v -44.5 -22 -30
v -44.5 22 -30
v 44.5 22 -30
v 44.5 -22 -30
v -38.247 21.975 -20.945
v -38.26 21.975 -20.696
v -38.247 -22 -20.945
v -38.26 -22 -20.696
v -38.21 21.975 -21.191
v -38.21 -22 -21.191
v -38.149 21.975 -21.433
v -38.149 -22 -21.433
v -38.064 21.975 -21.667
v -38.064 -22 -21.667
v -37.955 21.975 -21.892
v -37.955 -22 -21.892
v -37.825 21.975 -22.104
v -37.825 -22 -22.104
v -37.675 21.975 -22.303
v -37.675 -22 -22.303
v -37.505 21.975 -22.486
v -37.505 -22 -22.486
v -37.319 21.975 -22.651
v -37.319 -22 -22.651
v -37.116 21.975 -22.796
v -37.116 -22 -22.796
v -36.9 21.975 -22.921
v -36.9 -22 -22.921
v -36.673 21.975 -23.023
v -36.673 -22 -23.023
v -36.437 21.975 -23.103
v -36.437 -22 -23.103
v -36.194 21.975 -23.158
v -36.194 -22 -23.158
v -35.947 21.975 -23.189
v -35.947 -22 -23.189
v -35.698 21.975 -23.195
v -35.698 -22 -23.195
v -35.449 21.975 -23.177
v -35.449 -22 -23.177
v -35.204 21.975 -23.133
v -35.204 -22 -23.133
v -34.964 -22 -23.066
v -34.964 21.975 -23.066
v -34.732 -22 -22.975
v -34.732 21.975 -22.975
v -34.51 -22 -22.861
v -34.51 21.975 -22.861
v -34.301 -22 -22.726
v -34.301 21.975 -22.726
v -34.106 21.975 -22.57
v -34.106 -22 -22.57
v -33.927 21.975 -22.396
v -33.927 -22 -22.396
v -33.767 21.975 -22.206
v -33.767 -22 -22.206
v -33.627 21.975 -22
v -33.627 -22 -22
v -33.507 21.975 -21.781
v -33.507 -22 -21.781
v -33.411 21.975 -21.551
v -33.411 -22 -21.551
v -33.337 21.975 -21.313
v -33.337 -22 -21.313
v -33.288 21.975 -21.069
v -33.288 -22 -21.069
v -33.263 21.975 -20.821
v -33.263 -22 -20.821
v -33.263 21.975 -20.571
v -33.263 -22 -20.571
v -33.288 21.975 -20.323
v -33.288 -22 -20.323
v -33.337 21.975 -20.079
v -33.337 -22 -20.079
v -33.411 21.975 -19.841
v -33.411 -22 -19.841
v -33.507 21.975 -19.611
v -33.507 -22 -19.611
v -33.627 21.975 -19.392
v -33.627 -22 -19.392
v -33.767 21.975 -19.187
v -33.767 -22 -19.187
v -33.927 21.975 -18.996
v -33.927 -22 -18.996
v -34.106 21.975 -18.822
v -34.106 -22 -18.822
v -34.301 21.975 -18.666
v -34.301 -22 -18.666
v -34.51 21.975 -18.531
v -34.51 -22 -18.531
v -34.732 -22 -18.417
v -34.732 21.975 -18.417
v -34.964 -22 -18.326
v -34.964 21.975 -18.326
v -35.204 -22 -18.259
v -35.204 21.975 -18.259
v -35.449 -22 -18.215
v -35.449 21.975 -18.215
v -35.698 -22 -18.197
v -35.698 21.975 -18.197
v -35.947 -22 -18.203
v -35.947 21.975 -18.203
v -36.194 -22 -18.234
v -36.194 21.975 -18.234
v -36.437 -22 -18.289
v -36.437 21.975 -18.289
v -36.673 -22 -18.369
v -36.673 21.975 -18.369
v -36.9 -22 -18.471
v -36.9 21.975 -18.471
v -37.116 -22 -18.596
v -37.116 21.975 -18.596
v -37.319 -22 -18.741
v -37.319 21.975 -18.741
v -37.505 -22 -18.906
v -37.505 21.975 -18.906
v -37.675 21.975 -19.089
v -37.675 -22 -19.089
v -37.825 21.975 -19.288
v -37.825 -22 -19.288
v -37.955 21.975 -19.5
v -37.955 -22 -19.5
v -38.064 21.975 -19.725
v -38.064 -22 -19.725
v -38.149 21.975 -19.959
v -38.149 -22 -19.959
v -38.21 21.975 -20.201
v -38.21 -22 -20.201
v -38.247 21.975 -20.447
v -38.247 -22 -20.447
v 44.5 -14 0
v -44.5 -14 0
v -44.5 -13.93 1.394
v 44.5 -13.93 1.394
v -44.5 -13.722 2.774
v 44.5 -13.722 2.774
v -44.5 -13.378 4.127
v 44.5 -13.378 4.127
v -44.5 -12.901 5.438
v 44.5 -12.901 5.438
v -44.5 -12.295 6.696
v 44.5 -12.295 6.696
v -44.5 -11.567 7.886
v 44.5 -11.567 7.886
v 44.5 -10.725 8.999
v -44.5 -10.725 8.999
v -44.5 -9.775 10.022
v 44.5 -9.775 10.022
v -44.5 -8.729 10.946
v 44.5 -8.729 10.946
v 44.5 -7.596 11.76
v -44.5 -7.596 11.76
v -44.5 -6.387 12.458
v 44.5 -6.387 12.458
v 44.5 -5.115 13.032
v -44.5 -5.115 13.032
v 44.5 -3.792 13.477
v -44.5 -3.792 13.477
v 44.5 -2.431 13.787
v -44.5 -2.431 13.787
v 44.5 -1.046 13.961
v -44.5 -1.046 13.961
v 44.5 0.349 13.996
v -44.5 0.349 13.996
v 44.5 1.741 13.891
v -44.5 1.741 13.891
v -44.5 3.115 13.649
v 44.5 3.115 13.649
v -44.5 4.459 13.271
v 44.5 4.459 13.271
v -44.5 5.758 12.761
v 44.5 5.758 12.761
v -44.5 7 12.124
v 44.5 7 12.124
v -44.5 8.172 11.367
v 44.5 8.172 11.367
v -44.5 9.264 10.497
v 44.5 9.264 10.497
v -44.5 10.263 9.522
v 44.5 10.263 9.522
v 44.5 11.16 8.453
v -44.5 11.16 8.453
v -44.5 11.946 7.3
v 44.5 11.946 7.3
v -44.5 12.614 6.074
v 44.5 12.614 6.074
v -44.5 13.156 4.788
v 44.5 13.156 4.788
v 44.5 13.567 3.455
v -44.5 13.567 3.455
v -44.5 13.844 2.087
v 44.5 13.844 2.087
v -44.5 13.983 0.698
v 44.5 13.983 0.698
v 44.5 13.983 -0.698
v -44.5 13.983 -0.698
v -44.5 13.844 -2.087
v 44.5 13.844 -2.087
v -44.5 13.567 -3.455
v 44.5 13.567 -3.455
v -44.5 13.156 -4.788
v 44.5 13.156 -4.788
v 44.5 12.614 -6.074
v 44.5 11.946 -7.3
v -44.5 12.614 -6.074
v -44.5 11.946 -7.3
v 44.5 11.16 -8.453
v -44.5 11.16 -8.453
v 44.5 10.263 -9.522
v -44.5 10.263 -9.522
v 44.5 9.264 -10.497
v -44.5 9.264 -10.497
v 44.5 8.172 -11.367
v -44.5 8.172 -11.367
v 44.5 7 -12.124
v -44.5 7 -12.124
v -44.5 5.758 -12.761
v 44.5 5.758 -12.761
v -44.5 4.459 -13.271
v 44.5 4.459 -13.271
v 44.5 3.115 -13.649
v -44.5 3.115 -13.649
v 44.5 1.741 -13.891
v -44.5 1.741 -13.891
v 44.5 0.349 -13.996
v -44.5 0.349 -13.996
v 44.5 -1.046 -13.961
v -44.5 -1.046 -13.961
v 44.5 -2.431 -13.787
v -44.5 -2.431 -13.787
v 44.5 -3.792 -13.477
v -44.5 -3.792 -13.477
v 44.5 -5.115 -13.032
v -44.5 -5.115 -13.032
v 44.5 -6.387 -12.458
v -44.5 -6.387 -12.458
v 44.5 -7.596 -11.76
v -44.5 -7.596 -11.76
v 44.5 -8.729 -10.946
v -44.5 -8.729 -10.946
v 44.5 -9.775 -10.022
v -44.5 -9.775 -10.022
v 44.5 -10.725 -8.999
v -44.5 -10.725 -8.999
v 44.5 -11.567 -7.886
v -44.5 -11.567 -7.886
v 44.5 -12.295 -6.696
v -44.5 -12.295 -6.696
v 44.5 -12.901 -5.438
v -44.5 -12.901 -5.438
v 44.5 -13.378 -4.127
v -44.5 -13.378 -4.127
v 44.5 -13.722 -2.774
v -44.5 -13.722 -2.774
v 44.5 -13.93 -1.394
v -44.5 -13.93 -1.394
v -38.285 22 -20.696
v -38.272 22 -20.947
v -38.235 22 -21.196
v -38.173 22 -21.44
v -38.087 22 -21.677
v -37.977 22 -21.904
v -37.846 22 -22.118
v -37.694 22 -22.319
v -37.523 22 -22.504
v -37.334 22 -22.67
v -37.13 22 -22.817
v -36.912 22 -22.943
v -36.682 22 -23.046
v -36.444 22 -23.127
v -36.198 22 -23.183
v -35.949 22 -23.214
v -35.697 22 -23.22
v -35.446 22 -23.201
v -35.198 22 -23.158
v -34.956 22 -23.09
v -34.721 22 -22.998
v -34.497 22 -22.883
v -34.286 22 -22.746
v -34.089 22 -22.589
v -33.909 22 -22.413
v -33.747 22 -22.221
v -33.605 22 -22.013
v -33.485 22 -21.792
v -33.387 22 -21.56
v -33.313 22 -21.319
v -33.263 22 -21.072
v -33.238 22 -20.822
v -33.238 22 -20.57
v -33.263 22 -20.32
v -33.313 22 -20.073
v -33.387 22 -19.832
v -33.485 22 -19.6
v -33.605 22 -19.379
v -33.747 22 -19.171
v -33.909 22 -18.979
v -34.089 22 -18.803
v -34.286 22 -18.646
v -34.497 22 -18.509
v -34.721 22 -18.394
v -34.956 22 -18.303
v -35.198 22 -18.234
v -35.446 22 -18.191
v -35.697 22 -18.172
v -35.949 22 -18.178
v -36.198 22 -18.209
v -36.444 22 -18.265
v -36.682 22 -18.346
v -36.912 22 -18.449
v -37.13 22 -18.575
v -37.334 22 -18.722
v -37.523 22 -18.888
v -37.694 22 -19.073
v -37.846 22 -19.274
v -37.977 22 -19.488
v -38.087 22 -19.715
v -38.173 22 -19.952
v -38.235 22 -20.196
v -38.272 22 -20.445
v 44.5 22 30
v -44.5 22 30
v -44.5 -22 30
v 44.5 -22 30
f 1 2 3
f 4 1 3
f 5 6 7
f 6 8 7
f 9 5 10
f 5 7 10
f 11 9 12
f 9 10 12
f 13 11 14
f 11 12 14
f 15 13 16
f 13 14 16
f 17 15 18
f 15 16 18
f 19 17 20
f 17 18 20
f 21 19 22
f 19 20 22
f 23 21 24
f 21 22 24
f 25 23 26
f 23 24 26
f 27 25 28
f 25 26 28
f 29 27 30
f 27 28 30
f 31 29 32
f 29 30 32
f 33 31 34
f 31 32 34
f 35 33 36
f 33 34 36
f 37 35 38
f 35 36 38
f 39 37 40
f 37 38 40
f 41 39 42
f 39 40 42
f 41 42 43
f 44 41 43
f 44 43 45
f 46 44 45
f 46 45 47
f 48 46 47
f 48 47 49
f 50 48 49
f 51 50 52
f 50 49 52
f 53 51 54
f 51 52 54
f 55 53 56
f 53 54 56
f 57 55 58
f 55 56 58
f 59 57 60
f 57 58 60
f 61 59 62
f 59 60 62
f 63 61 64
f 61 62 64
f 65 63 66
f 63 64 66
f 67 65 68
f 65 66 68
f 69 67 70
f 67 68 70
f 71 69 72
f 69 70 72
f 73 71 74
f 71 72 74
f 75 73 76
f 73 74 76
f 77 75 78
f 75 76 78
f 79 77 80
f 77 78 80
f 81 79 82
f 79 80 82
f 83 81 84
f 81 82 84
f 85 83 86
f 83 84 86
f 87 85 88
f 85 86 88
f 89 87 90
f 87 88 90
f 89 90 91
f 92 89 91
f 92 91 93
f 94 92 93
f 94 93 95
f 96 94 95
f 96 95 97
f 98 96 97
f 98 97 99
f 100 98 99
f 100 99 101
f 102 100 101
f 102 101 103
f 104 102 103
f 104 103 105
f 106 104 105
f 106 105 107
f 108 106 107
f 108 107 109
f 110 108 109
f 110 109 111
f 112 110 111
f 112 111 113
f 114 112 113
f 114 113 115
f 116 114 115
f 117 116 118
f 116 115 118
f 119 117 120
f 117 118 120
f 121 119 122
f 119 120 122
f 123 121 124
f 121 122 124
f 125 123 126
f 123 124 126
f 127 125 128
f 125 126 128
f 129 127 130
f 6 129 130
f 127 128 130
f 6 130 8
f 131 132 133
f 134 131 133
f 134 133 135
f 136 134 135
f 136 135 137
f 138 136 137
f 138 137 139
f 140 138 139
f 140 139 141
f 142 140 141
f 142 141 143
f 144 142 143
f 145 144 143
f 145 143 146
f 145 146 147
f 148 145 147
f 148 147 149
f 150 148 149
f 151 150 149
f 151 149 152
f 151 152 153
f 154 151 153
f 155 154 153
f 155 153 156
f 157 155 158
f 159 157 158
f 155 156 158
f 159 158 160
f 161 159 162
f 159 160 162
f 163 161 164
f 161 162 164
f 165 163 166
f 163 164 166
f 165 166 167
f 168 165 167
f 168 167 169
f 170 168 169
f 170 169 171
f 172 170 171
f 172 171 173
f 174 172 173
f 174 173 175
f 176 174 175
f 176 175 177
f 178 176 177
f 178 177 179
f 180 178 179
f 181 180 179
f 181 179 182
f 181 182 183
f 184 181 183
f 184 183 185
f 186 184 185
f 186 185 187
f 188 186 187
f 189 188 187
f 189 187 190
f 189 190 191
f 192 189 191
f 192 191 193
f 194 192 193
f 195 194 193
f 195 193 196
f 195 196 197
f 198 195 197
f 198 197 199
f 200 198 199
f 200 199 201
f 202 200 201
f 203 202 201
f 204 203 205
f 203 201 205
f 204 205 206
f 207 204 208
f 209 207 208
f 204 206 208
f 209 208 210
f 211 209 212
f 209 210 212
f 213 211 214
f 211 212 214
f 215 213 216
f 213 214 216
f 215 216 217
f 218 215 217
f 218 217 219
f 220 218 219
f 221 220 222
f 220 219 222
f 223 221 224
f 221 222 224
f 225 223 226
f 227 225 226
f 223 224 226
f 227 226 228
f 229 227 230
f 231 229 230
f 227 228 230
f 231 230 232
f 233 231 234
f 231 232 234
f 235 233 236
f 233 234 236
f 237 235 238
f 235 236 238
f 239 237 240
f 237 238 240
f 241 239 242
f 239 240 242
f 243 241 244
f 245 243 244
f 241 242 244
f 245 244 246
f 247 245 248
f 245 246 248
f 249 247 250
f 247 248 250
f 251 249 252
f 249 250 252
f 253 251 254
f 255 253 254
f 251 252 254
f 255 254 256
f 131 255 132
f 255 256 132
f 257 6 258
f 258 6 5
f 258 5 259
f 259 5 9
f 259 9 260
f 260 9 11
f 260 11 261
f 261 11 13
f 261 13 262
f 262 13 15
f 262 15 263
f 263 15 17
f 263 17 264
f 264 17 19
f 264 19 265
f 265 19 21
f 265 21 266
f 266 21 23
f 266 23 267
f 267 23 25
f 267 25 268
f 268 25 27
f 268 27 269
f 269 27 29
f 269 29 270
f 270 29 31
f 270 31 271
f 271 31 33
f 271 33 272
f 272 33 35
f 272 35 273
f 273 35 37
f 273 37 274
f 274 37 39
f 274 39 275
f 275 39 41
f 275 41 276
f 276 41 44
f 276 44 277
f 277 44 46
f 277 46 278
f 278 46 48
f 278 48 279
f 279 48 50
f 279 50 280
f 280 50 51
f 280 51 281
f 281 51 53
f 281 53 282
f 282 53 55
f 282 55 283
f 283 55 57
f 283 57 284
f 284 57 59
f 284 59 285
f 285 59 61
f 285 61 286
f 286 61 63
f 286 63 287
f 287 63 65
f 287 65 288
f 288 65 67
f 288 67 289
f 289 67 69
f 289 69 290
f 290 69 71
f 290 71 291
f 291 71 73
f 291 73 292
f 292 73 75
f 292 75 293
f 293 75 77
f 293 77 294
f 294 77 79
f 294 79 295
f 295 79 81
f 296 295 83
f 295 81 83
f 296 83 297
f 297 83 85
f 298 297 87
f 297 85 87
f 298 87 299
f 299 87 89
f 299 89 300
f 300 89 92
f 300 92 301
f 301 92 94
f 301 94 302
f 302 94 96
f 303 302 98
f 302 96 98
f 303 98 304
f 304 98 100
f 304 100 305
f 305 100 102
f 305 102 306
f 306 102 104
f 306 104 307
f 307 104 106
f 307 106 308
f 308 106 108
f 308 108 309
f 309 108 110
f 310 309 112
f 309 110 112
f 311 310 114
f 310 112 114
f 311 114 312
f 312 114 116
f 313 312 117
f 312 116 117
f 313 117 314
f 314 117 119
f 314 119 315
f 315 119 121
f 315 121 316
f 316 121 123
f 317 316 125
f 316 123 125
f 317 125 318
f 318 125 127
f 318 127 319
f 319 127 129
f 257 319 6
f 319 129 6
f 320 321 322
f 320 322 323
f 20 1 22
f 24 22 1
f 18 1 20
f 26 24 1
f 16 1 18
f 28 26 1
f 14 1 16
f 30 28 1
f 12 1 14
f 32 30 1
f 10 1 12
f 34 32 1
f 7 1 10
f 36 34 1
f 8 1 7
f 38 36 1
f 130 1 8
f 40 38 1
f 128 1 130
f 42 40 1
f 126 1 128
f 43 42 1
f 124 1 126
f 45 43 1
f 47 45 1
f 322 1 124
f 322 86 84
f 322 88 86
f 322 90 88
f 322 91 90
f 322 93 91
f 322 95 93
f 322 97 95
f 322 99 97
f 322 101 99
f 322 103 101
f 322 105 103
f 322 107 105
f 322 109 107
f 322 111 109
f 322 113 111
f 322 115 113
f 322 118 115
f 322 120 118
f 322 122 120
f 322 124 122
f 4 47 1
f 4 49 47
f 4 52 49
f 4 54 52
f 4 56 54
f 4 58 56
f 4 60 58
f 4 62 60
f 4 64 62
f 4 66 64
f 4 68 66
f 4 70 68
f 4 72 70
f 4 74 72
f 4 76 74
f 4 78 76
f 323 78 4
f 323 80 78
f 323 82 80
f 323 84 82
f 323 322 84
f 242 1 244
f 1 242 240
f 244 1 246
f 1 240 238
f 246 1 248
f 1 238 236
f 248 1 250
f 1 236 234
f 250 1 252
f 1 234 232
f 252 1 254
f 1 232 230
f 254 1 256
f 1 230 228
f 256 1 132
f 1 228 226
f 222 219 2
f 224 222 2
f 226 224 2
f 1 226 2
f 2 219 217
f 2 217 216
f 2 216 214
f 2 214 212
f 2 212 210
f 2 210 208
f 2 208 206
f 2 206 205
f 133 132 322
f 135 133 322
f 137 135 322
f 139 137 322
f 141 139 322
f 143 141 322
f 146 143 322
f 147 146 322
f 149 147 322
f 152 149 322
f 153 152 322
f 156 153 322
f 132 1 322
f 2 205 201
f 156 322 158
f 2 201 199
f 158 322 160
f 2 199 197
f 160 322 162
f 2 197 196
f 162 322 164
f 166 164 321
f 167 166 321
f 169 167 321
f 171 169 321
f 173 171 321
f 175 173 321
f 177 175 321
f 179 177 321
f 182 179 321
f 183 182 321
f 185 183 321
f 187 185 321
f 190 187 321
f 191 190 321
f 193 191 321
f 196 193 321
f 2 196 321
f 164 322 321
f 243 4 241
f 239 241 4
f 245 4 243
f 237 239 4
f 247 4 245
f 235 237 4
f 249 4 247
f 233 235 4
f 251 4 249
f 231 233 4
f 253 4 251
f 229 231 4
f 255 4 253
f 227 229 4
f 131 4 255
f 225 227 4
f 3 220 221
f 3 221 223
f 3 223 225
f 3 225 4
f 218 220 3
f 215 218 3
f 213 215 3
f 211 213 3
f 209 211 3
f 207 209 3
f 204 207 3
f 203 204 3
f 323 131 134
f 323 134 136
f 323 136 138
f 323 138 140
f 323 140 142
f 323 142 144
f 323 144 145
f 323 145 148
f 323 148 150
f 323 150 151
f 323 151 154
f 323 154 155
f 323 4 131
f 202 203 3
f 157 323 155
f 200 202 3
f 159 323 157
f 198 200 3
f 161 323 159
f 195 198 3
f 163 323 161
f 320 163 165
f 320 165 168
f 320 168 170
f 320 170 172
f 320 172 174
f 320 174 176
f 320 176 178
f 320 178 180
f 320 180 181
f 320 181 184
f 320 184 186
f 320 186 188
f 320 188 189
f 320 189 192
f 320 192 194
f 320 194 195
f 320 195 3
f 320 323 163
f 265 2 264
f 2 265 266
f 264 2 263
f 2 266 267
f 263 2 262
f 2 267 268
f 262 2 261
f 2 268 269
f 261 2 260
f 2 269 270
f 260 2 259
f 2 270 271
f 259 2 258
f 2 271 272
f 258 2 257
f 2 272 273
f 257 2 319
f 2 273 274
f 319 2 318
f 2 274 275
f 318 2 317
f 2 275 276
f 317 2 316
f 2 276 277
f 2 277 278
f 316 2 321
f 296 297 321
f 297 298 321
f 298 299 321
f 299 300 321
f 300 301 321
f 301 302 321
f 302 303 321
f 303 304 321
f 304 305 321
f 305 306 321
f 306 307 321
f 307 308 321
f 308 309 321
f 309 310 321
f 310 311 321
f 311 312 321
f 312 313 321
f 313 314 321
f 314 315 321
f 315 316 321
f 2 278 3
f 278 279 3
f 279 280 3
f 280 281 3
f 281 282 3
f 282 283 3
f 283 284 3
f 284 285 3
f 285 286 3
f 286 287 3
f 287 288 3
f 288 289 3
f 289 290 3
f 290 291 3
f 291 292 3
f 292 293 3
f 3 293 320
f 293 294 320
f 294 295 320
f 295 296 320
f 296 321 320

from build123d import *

# Parameters (mm, degrees)
SKETCH1_W                       = 89
SKETCH1_H                       = 44
BOSS_EXTRUDE1_DEPTH             = 30
SKETCH3_R                       = 14
CUT_EXTRUDE1_DEPTH              = 97.462427919
F_5_0MM_DOWEL_HOLE1_D           = 5
F_5_0MM_DOWEL_HOLE1_CSINK_D     = 5.05
F_5_0MM_DOWEL_HOLE1_CSINK_ANGLE = 90


with BuildPart() as part:
    # Sketch1 → Boss-Extrude1 (new, symmetric)
    with BuildSketch(Plane.XY):
        Rectangle(SKETCH1_W, SKETCH1_H)
    extrude(amount=BOSS_EXTRUDE1_DEPTH, both=True)

    # Sketch3 → Cut-Extrude1 (cut, through all)
    with BuildSketch(Plane.ZY.offset(44.5)):
        with Locations(Location((0, 0, 0), (0, 0, 270))):
            Circle(SKETCH3_R)
    extrude(amount=-CUT_EXTRUDE1_DEPTH, mode=Mode.SUBTRACT)

    # Ø5.0mm Dowel Hole1 (through all)
    with Locations(Plane(origin=(0, 22, 0), x_dir=(1, 0, 0), z_dir=(0, 1, 0))):
        with Locations((-35.759887734, 20.696035026)):
            CounterSinkHole(F_5_0MM_DOWEL_HOLE1_D / 2, F_5_0MM_DOWEL_HOLE1_CSINK_D / 2, counter_sink_angle=F_5_0MM_DOWEL_HOLE1_CSINK_ANGLE)


solid = part.part
